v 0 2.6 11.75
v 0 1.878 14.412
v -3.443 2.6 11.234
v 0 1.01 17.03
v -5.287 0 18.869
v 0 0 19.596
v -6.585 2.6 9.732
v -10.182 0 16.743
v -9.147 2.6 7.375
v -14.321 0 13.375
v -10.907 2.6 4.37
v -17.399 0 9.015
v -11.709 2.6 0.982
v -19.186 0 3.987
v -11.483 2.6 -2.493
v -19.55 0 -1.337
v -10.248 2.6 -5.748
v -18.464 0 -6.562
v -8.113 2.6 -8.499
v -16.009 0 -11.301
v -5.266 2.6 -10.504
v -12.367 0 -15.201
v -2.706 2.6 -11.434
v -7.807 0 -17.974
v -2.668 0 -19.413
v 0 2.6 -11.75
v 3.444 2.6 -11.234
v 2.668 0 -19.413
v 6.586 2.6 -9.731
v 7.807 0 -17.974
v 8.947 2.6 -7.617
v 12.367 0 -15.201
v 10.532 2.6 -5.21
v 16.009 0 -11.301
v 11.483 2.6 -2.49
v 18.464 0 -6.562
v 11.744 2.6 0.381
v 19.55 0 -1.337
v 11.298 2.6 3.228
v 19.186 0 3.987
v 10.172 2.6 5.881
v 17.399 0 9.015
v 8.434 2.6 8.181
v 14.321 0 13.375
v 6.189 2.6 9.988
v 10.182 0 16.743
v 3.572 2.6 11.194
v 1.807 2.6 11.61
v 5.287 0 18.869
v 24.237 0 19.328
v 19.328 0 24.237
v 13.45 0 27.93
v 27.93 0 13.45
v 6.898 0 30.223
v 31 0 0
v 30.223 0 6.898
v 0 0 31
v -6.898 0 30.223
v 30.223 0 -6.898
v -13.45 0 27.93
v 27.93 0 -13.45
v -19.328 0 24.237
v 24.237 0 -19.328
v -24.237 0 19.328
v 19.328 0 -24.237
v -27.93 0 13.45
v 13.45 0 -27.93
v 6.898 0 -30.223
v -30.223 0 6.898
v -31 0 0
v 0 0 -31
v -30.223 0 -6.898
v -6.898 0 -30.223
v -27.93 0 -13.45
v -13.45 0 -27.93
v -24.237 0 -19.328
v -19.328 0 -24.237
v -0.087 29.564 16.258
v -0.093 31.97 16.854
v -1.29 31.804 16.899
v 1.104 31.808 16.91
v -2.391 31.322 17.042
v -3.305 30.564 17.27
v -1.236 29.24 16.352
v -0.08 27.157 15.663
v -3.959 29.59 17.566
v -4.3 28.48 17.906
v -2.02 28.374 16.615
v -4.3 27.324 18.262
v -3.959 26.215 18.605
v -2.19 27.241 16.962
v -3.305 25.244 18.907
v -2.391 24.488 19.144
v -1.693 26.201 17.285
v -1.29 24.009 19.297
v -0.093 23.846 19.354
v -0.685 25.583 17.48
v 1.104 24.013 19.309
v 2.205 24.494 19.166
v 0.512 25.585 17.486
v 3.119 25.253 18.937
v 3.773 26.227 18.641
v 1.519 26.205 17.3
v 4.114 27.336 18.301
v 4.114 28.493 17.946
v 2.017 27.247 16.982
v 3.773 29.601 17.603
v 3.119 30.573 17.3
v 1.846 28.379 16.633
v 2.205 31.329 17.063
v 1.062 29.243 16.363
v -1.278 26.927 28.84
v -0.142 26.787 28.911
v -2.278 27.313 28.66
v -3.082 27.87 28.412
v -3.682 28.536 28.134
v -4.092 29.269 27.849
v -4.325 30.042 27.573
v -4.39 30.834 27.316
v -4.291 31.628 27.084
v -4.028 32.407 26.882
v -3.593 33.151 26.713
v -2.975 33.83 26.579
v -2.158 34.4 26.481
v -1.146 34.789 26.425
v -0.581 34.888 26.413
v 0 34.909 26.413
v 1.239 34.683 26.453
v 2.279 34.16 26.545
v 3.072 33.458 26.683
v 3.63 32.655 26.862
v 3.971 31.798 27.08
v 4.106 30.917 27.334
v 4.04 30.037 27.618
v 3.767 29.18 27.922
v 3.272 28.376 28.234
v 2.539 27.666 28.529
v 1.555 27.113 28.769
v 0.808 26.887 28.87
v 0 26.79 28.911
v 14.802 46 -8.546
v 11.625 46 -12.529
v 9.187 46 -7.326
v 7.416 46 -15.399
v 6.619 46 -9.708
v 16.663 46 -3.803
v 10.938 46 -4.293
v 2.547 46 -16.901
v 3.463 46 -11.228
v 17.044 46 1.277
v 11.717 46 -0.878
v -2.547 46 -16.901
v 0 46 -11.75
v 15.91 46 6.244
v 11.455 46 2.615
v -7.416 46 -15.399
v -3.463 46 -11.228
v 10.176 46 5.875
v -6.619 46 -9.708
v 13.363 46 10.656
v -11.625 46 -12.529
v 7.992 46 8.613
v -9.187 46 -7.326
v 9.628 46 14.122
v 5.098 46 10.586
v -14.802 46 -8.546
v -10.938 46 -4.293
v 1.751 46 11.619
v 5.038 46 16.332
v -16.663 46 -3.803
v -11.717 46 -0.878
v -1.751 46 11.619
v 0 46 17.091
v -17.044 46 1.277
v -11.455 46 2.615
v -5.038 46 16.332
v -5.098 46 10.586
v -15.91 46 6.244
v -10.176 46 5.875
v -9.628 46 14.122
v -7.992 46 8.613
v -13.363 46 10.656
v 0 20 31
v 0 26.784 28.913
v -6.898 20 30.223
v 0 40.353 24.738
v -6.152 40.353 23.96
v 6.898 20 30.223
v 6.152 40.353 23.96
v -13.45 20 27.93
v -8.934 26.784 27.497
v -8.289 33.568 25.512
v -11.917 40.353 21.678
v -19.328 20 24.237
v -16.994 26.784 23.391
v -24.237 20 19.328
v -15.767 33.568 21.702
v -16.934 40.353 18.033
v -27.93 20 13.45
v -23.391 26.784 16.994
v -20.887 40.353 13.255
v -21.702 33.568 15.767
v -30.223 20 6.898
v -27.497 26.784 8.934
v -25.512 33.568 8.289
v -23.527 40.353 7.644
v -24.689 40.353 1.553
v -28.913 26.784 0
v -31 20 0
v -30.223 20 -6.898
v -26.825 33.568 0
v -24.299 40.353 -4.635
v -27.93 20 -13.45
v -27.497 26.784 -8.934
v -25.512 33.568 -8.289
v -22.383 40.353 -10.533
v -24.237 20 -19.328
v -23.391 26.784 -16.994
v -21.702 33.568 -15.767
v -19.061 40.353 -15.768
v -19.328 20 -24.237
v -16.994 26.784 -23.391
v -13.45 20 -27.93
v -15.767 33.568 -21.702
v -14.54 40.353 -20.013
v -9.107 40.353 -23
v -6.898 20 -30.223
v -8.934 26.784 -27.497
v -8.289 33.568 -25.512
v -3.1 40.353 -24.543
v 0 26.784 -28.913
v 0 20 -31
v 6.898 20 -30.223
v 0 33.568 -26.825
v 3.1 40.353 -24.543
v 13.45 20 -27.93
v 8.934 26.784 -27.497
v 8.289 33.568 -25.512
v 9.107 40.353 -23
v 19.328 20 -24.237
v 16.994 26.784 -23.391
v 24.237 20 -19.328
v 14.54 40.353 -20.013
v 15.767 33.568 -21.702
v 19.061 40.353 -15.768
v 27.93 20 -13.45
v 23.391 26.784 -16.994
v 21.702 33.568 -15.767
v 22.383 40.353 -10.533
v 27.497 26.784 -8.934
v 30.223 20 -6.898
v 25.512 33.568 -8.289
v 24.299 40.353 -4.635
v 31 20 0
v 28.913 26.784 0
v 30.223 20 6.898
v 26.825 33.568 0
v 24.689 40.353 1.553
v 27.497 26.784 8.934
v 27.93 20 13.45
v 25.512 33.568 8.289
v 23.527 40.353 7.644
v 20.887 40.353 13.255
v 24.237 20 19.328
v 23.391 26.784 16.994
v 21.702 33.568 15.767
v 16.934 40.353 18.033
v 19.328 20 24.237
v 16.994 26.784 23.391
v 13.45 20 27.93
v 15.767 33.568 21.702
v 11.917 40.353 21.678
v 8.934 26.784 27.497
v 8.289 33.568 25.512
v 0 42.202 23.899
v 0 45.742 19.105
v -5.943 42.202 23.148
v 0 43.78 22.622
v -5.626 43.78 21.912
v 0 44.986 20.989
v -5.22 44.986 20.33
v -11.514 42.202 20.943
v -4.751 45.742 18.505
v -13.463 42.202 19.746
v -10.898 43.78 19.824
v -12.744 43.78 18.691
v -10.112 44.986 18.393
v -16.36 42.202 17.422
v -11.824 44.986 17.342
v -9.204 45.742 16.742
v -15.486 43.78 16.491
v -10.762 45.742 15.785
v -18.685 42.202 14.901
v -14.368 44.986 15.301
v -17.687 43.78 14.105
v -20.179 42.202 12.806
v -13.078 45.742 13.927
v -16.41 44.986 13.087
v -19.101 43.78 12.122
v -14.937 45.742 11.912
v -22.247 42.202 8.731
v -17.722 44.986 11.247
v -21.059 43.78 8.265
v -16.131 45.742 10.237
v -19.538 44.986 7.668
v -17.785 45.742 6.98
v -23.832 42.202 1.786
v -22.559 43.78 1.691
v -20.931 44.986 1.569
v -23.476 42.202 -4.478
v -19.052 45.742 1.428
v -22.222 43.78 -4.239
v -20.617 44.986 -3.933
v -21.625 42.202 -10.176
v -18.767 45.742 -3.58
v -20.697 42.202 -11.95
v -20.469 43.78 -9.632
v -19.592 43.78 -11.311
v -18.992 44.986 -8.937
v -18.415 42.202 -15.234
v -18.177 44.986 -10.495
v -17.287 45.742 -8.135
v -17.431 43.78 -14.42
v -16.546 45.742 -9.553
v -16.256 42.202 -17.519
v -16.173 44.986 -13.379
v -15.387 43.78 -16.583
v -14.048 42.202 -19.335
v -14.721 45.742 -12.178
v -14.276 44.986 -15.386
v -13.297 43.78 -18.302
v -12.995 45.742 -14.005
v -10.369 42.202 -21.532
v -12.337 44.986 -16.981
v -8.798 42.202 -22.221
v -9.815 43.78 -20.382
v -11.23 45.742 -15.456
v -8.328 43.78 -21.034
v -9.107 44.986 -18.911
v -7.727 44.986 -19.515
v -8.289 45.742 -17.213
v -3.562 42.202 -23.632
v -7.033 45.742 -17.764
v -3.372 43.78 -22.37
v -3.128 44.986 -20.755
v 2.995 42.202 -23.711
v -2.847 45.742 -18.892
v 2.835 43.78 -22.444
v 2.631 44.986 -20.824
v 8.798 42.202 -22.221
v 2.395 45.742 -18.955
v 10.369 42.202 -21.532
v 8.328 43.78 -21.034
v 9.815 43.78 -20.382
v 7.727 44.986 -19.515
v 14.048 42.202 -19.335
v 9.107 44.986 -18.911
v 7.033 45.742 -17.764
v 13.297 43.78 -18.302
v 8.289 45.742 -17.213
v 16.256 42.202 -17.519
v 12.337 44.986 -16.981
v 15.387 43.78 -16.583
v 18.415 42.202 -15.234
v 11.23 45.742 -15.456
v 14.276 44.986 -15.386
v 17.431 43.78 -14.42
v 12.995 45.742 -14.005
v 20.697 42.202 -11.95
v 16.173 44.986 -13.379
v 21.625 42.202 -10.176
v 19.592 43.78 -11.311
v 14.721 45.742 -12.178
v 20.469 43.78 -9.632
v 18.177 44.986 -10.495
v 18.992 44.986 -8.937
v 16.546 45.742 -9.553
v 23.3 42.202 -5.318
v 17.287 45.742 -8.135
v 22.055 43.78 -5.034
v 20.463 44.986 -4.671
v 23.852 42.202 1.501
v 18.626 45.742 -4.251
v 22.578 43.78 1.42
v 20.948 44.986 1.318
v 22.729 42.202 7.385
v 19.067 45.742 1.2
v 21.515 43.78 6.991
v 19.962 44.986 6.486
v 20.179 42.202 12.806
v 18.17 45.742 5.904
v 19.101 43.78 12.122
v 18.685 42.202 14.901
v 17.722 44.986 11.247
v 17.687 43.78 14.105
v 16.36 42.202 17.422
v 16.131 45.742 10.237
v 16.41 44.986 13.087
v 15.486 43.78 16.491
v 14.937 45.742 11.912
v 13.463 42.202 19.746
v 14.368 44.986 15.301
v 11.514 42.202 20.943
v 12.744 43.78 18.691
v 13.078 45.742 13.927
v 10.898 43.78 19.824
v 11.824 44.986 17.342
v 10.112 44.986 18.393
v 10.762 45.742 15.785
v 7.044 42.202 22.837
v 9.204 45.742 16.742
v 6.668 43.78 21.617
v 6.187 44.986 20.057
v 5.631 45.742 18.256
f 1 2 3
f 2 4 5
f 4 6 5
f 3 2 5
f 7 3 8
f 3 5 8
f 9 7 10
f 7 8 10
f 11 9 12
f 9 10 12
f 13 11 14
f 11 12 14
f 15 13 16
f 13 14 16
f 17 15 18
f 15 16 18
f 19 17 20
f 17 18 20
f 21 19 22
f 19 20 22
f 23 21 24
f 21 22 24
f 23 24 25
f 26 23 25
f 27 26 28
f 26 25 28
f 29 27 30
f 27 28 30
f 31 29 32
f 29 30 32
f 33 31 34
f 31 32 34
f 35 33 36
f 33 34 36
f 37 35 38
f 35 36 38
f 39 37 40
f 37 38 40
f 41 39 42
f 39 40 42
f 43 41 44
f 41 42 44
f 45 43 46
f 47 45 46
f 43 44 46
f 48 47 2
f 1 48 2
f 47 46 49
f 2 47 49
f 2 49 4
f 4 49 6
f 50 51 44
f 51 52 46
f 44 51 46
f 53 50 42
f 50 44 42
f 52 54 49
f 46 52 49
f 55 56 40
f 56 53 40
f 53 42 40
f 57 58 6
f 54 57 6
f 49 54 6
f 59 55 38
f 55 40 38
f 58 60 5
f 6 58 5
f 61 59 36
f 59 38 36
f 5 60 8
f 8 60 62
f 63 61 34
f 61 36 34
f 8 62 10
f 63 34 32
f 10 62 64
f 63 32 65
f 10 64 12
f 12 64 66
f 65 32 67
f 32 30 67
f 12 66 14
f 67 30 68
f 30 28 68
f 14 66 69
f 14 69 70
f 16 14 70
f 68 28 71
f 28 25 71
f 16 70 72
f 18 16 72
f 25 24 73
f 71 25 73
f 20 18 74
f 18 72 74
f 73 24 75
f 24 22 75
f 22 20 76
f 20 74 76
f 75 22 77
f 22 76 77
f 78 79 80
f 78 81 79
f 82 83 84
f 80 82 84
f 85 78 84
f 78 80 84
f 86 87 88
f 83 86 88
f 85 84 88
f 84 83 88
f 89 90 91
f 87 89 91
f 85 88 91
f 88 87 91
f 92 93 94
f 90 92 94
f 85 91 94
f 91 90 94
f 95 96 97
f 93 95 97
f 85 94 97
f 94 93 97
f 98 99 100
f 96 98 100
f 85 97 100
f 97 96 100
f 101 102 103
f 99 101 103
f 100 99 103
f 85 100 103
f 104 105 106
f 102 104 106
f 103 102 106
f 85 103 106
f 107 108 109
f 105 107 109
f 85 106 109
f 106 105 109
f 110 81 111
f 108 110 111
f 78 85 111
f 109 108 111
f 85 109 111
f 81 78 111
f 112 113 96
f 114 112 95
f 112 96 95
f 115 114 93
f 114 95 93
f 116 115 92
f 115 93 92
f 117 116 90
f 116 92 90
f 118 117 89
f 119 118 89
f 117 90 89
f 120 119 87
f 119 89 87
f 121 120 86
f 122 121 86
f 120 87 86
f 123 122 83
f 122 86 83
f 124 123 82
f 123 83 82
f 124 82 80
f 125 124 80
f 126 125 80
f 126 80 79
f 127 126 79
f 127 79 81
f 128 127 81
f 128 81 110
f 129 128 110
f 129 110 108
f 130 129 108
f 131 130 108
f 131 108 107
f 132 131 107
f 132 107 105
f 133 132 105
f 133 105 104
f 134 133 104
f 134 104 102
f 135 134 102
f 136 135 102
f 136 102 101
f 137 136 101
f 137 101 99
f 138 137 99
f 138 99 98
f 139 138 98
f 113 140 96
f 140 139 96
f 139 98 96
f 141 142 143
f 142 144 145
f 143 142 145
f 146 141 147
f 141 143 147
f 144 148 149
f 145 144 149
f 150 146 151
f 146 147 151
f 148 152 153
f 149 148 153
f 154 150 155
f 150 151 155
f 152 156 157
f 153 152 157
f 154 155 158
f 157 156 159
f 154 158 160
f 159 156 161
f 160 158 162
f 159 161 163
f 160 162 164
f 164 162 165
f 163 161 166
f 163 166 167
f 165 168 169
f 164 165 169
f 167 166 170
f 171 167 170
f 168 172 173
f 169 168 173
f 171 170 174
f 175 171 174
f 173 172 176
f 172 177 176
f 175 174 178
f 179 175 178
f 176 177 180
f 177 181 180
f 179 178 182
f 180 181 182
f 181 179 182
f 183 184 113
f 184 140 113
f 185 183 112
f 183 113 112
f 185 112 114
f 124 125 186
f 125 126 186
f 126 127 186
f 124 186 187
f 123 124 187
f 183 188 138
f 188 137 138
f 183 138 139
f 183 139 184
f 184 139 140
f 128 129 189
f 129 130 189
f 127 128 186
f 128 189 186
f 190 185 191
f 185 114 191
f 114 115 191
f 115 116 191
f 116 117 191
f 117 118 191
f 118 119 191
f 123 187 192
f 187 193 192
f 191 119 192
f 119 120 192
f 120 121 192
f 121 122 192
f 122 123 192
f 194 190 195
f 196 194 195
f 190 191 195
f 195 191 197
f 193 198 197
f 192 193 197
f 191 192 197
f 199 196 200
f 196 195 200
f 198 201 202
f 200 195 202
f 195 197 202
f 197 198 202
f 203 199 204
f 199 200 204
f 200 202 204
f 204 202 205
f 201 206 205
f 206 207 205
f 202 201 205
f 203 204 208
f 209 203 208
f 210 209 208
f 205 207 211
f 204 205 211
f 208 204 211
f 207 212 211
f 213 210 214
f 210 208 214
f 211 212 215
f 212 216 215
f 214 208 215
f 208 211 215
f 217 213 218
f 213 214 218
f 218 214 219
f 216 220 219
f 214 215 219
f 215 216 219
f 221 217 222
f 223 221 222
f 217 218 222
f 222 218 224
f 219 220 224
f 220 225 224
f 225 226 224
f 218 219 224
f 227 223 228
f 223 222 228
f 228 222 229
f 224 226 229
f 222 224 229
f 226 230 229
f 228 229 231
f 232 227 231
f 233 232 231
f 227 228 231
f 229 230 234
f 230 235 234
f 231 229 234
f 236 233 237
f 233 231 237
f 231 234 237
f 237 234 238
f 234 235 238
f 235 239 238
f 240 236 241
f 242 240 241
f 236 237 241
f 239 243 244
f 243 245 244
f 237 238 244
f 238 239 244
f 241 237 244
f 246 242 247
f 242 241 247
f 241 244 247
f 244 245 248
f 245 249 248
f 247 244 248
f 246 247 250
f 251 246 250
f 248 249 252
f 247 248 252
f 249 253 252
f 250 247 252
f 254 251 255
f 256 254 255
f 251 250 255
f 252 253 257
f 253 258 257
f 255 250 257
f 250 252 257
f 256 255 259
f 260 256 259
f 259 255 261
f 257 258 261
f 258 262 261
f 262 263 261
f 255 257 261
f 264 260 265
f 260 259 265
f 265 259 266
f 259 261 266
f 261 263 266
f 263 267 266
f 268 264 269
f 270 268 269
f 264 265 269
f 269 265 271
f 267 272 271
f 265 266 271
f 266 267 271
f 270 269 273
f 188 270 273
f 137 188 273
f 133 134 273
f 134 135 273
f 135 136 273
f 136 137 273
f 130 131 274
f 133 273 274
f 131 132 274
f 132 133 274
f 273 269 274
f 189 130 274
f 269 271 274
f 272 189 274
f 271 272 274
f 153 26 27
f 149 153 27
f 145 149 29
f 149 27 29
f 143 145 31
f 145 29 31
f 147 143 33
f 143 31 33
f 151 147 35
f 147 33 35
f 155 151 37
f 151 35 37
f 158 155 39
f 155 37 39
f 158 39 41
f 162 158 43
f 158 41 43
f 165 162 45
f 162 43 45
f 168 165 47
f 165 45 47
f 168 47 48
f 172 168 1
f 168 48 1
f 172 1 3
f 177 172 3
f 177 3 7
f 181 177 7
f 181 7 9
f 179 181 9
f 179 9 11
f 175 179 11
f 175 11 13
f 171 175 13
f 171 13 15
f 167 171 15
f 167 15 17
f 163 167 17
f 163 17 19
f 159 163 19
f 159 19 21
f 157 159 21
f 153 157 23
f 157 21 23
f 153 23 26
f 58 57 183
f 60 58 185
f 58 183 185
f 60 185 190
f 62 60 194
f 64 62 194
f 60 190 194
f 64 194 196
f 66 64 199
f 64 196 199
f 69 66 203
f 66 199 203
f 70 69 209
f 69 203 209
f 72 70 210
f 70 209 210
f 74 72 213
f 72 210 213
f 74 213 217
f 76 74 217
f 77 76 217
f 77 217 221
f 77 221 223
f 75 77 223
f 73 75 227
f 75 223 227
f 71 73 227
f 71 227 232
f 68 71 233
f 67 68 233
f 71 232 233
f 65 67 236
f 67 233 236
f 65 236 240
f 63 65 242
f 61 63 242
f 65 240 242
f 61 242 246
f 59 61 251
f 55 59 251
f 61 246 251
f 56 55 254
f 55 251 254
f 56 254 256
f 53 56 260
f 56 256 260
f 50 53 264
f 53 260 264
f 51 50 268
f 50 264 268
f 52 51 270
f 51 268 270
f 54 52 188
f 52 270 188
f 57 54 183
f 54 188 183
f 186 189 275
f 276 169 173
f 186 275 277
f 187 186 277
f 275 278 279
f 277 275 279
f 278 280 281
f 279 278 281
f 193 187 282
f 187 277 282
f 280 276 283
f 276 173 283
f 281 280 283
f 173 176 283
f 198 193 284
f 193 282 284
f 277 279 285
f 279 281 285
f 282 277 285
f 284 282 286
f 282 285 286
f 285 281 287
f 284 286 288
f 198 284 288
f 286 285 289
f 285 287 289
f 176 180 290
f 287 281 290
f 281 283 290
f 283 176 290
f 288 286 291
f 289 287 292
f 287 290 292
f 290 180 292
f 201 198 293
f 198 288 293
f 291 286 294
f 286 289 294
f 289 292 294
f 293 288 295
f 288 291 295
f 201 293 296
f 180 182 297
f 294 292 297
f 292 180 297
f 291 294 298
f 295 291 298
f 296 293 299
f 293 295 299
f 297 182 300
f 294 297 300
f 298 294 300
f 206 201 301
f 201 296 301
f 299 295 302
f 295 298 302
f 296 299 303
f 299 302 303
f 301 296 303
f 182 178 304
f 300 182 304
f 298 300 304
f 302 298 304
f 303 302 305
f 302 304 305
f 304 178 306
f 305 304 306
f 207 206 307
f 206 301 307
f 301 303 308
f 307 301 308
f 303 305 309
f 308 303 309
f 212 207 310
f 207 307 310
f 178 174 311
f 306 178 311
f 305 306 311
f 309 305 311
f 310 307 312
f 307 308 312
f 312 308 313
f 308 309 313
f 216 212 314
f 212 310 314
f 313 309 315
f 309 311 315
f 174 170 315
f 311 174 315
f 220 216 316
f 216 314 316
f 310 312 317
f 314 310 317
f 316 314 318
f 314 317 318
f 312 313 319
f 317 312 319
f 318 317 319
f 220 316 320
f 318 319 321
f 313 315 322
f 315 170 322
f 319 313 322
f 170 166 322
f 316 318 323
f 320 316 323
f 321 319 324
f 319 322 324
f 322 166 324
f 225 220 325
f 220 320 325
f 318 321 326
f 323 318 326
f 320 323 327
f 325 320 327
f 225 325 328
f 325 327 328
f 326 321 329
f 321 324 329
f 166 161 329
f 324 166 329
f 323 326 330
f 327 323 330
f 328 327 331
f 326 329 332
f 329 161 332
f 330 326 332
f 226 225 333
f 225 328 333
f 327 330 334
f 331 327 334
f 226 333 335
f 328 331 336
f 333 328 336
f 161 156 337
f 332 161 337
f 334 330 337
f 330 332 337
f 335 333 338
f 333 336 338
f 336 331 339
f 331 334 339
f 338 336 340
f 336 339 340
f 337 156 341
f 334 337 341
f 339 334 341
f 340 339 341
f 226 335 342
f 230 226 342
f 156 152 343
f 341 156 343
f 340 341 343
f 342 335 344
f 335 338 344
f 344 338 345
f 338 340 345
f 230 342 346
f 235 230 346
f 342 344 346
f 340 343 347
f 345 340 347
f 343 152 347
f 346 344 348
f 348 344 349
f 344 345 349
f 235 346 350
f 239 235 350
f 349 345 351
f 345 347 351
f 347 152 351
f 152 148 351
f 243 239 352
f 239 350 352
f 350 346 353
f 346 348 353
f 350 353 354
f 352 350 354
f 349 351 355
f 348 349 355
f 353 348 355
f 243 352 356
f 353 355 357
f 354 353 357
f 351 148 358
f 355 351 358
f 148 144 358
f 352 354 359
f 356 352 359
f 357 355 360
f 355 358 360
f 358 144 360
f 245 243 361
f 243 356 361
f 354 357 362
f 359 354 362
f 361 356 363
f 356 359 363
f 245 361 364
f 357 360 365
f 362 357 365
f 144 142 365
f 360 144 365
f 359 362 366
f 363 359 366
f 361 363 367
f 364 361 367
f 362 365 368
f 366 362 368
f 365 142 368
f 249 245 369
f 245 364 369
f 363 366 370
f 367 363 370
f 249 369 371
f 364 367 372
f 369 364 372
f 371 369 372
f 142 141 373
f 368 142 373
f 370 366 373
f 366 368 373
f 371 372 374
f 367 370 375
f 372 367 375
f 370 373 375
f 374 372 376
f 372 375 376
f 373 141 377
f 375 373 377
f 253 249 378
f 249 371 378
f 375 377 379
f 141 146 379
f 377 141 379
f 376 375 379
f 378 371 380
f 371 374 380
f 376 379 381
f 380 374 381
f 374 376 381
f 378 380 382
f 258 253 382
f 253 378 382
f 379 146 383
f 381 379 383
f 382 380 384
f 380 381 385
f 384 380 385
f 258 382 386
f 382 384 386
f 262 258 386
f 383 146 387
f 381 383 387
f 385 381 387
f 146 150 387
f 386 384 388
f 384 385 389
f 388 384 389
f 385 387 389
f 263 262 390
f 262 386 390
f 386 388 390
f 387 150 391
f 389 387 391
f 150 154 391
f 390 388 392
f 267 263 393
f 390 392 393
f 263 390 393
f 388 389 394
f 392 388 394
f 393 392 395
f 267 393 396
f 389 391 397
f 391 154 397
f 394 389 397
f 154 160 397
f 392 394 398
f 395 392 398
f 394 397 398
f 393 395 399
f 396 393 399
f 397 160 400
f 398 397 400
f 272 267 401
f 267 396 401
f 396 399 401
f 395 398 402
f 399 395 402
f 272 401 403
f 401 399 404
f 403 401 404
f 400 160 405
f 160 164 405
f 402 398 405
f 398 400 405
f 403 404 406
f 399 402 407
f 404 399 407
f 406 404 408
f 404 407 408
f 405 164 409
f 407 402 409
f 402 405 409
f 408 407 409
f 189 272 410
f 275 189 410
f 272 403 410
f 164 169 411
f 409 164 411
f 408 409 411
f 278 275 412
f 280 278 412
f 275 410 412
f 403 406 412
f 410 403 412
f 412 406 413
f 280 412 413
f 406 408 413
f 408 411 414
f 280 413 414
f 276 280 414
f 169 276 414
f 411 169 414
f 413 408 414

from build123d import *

# Parameters (mm, degrees)
FILLET1_R              = 8
M10_TAPPED_HOLE1_D     = 8.5
M10_TAPPED_HOLE1_DEPTH = 10
M10_TAPPED_HOLE1_TIP   = 2.553657631
M25X1_5_TAPPED_HOLE1_D = 23.5


with BuildPart() as part:
    # Sketch2 → Revolve1 (revolve)
    with BuildSketch(Plane.XY, mode=Mode.PRIVATE) as revolve1_sk:
        with BuildLine():
            Line((19.595917942, 0), (31, 0))
            Line((31, 0), (31, 20))
            Line((31, 20), (23, 46))
            Line((23, 46), (0, 46))
            Line((0, 46), (0, 4))
            ThreePointArc((0, 4), (10, 2.989794856), (19.595917942, 0))
        make_face()
    revolve(revolve1_sk.sketch.rotate(Axis((0, 46, 0), (0, -1, 0)), 90), axis=Axis((0, 46, 0), (0, -1, 0)))

    # Fillet1
    fillet1_edges = [part.edges().sort_by_distance(p)[0] for p in [
        (0, 46, -23),
    ]]
    fillet(fillet1_edges, radius=FILLET1_R)

    # M10 Tapped Hole1
    with Locations(Plane(origin=(-0.142010422, 30.849228359, 27.66141136), x_dir=(0, 0.955777919374, -0.294089389196), z_dir=(-0.00490679199, 0.294085848838, 0.955766413359))):
        with Locations((0, 0)):
            Hole(M10_TAPPED_HOLE1_D / 2, depth=M10_TAPPED_HOLE1_DEPTH)
            with Locations((0, 0, -(M10_TAPPED_HOLE1_DEPTH + M10_TAPPED_HOLE1_TIP / 2))):  # 118° drill point
                Cone(0, M10_TAPPED_HOLE1_D / 2, M10_TAPPED_HOLE1_TIP, mode=Mode.SUBTRACT)

    # M25x1.5 Tapped Hole1 (through all)
    with Locations(Plane.ZX.offset(46)):
        with Locations((0, 0)):
            Hole(M25X1_5_TAPPED_HOLE1_D / 2)


solid = part.part
